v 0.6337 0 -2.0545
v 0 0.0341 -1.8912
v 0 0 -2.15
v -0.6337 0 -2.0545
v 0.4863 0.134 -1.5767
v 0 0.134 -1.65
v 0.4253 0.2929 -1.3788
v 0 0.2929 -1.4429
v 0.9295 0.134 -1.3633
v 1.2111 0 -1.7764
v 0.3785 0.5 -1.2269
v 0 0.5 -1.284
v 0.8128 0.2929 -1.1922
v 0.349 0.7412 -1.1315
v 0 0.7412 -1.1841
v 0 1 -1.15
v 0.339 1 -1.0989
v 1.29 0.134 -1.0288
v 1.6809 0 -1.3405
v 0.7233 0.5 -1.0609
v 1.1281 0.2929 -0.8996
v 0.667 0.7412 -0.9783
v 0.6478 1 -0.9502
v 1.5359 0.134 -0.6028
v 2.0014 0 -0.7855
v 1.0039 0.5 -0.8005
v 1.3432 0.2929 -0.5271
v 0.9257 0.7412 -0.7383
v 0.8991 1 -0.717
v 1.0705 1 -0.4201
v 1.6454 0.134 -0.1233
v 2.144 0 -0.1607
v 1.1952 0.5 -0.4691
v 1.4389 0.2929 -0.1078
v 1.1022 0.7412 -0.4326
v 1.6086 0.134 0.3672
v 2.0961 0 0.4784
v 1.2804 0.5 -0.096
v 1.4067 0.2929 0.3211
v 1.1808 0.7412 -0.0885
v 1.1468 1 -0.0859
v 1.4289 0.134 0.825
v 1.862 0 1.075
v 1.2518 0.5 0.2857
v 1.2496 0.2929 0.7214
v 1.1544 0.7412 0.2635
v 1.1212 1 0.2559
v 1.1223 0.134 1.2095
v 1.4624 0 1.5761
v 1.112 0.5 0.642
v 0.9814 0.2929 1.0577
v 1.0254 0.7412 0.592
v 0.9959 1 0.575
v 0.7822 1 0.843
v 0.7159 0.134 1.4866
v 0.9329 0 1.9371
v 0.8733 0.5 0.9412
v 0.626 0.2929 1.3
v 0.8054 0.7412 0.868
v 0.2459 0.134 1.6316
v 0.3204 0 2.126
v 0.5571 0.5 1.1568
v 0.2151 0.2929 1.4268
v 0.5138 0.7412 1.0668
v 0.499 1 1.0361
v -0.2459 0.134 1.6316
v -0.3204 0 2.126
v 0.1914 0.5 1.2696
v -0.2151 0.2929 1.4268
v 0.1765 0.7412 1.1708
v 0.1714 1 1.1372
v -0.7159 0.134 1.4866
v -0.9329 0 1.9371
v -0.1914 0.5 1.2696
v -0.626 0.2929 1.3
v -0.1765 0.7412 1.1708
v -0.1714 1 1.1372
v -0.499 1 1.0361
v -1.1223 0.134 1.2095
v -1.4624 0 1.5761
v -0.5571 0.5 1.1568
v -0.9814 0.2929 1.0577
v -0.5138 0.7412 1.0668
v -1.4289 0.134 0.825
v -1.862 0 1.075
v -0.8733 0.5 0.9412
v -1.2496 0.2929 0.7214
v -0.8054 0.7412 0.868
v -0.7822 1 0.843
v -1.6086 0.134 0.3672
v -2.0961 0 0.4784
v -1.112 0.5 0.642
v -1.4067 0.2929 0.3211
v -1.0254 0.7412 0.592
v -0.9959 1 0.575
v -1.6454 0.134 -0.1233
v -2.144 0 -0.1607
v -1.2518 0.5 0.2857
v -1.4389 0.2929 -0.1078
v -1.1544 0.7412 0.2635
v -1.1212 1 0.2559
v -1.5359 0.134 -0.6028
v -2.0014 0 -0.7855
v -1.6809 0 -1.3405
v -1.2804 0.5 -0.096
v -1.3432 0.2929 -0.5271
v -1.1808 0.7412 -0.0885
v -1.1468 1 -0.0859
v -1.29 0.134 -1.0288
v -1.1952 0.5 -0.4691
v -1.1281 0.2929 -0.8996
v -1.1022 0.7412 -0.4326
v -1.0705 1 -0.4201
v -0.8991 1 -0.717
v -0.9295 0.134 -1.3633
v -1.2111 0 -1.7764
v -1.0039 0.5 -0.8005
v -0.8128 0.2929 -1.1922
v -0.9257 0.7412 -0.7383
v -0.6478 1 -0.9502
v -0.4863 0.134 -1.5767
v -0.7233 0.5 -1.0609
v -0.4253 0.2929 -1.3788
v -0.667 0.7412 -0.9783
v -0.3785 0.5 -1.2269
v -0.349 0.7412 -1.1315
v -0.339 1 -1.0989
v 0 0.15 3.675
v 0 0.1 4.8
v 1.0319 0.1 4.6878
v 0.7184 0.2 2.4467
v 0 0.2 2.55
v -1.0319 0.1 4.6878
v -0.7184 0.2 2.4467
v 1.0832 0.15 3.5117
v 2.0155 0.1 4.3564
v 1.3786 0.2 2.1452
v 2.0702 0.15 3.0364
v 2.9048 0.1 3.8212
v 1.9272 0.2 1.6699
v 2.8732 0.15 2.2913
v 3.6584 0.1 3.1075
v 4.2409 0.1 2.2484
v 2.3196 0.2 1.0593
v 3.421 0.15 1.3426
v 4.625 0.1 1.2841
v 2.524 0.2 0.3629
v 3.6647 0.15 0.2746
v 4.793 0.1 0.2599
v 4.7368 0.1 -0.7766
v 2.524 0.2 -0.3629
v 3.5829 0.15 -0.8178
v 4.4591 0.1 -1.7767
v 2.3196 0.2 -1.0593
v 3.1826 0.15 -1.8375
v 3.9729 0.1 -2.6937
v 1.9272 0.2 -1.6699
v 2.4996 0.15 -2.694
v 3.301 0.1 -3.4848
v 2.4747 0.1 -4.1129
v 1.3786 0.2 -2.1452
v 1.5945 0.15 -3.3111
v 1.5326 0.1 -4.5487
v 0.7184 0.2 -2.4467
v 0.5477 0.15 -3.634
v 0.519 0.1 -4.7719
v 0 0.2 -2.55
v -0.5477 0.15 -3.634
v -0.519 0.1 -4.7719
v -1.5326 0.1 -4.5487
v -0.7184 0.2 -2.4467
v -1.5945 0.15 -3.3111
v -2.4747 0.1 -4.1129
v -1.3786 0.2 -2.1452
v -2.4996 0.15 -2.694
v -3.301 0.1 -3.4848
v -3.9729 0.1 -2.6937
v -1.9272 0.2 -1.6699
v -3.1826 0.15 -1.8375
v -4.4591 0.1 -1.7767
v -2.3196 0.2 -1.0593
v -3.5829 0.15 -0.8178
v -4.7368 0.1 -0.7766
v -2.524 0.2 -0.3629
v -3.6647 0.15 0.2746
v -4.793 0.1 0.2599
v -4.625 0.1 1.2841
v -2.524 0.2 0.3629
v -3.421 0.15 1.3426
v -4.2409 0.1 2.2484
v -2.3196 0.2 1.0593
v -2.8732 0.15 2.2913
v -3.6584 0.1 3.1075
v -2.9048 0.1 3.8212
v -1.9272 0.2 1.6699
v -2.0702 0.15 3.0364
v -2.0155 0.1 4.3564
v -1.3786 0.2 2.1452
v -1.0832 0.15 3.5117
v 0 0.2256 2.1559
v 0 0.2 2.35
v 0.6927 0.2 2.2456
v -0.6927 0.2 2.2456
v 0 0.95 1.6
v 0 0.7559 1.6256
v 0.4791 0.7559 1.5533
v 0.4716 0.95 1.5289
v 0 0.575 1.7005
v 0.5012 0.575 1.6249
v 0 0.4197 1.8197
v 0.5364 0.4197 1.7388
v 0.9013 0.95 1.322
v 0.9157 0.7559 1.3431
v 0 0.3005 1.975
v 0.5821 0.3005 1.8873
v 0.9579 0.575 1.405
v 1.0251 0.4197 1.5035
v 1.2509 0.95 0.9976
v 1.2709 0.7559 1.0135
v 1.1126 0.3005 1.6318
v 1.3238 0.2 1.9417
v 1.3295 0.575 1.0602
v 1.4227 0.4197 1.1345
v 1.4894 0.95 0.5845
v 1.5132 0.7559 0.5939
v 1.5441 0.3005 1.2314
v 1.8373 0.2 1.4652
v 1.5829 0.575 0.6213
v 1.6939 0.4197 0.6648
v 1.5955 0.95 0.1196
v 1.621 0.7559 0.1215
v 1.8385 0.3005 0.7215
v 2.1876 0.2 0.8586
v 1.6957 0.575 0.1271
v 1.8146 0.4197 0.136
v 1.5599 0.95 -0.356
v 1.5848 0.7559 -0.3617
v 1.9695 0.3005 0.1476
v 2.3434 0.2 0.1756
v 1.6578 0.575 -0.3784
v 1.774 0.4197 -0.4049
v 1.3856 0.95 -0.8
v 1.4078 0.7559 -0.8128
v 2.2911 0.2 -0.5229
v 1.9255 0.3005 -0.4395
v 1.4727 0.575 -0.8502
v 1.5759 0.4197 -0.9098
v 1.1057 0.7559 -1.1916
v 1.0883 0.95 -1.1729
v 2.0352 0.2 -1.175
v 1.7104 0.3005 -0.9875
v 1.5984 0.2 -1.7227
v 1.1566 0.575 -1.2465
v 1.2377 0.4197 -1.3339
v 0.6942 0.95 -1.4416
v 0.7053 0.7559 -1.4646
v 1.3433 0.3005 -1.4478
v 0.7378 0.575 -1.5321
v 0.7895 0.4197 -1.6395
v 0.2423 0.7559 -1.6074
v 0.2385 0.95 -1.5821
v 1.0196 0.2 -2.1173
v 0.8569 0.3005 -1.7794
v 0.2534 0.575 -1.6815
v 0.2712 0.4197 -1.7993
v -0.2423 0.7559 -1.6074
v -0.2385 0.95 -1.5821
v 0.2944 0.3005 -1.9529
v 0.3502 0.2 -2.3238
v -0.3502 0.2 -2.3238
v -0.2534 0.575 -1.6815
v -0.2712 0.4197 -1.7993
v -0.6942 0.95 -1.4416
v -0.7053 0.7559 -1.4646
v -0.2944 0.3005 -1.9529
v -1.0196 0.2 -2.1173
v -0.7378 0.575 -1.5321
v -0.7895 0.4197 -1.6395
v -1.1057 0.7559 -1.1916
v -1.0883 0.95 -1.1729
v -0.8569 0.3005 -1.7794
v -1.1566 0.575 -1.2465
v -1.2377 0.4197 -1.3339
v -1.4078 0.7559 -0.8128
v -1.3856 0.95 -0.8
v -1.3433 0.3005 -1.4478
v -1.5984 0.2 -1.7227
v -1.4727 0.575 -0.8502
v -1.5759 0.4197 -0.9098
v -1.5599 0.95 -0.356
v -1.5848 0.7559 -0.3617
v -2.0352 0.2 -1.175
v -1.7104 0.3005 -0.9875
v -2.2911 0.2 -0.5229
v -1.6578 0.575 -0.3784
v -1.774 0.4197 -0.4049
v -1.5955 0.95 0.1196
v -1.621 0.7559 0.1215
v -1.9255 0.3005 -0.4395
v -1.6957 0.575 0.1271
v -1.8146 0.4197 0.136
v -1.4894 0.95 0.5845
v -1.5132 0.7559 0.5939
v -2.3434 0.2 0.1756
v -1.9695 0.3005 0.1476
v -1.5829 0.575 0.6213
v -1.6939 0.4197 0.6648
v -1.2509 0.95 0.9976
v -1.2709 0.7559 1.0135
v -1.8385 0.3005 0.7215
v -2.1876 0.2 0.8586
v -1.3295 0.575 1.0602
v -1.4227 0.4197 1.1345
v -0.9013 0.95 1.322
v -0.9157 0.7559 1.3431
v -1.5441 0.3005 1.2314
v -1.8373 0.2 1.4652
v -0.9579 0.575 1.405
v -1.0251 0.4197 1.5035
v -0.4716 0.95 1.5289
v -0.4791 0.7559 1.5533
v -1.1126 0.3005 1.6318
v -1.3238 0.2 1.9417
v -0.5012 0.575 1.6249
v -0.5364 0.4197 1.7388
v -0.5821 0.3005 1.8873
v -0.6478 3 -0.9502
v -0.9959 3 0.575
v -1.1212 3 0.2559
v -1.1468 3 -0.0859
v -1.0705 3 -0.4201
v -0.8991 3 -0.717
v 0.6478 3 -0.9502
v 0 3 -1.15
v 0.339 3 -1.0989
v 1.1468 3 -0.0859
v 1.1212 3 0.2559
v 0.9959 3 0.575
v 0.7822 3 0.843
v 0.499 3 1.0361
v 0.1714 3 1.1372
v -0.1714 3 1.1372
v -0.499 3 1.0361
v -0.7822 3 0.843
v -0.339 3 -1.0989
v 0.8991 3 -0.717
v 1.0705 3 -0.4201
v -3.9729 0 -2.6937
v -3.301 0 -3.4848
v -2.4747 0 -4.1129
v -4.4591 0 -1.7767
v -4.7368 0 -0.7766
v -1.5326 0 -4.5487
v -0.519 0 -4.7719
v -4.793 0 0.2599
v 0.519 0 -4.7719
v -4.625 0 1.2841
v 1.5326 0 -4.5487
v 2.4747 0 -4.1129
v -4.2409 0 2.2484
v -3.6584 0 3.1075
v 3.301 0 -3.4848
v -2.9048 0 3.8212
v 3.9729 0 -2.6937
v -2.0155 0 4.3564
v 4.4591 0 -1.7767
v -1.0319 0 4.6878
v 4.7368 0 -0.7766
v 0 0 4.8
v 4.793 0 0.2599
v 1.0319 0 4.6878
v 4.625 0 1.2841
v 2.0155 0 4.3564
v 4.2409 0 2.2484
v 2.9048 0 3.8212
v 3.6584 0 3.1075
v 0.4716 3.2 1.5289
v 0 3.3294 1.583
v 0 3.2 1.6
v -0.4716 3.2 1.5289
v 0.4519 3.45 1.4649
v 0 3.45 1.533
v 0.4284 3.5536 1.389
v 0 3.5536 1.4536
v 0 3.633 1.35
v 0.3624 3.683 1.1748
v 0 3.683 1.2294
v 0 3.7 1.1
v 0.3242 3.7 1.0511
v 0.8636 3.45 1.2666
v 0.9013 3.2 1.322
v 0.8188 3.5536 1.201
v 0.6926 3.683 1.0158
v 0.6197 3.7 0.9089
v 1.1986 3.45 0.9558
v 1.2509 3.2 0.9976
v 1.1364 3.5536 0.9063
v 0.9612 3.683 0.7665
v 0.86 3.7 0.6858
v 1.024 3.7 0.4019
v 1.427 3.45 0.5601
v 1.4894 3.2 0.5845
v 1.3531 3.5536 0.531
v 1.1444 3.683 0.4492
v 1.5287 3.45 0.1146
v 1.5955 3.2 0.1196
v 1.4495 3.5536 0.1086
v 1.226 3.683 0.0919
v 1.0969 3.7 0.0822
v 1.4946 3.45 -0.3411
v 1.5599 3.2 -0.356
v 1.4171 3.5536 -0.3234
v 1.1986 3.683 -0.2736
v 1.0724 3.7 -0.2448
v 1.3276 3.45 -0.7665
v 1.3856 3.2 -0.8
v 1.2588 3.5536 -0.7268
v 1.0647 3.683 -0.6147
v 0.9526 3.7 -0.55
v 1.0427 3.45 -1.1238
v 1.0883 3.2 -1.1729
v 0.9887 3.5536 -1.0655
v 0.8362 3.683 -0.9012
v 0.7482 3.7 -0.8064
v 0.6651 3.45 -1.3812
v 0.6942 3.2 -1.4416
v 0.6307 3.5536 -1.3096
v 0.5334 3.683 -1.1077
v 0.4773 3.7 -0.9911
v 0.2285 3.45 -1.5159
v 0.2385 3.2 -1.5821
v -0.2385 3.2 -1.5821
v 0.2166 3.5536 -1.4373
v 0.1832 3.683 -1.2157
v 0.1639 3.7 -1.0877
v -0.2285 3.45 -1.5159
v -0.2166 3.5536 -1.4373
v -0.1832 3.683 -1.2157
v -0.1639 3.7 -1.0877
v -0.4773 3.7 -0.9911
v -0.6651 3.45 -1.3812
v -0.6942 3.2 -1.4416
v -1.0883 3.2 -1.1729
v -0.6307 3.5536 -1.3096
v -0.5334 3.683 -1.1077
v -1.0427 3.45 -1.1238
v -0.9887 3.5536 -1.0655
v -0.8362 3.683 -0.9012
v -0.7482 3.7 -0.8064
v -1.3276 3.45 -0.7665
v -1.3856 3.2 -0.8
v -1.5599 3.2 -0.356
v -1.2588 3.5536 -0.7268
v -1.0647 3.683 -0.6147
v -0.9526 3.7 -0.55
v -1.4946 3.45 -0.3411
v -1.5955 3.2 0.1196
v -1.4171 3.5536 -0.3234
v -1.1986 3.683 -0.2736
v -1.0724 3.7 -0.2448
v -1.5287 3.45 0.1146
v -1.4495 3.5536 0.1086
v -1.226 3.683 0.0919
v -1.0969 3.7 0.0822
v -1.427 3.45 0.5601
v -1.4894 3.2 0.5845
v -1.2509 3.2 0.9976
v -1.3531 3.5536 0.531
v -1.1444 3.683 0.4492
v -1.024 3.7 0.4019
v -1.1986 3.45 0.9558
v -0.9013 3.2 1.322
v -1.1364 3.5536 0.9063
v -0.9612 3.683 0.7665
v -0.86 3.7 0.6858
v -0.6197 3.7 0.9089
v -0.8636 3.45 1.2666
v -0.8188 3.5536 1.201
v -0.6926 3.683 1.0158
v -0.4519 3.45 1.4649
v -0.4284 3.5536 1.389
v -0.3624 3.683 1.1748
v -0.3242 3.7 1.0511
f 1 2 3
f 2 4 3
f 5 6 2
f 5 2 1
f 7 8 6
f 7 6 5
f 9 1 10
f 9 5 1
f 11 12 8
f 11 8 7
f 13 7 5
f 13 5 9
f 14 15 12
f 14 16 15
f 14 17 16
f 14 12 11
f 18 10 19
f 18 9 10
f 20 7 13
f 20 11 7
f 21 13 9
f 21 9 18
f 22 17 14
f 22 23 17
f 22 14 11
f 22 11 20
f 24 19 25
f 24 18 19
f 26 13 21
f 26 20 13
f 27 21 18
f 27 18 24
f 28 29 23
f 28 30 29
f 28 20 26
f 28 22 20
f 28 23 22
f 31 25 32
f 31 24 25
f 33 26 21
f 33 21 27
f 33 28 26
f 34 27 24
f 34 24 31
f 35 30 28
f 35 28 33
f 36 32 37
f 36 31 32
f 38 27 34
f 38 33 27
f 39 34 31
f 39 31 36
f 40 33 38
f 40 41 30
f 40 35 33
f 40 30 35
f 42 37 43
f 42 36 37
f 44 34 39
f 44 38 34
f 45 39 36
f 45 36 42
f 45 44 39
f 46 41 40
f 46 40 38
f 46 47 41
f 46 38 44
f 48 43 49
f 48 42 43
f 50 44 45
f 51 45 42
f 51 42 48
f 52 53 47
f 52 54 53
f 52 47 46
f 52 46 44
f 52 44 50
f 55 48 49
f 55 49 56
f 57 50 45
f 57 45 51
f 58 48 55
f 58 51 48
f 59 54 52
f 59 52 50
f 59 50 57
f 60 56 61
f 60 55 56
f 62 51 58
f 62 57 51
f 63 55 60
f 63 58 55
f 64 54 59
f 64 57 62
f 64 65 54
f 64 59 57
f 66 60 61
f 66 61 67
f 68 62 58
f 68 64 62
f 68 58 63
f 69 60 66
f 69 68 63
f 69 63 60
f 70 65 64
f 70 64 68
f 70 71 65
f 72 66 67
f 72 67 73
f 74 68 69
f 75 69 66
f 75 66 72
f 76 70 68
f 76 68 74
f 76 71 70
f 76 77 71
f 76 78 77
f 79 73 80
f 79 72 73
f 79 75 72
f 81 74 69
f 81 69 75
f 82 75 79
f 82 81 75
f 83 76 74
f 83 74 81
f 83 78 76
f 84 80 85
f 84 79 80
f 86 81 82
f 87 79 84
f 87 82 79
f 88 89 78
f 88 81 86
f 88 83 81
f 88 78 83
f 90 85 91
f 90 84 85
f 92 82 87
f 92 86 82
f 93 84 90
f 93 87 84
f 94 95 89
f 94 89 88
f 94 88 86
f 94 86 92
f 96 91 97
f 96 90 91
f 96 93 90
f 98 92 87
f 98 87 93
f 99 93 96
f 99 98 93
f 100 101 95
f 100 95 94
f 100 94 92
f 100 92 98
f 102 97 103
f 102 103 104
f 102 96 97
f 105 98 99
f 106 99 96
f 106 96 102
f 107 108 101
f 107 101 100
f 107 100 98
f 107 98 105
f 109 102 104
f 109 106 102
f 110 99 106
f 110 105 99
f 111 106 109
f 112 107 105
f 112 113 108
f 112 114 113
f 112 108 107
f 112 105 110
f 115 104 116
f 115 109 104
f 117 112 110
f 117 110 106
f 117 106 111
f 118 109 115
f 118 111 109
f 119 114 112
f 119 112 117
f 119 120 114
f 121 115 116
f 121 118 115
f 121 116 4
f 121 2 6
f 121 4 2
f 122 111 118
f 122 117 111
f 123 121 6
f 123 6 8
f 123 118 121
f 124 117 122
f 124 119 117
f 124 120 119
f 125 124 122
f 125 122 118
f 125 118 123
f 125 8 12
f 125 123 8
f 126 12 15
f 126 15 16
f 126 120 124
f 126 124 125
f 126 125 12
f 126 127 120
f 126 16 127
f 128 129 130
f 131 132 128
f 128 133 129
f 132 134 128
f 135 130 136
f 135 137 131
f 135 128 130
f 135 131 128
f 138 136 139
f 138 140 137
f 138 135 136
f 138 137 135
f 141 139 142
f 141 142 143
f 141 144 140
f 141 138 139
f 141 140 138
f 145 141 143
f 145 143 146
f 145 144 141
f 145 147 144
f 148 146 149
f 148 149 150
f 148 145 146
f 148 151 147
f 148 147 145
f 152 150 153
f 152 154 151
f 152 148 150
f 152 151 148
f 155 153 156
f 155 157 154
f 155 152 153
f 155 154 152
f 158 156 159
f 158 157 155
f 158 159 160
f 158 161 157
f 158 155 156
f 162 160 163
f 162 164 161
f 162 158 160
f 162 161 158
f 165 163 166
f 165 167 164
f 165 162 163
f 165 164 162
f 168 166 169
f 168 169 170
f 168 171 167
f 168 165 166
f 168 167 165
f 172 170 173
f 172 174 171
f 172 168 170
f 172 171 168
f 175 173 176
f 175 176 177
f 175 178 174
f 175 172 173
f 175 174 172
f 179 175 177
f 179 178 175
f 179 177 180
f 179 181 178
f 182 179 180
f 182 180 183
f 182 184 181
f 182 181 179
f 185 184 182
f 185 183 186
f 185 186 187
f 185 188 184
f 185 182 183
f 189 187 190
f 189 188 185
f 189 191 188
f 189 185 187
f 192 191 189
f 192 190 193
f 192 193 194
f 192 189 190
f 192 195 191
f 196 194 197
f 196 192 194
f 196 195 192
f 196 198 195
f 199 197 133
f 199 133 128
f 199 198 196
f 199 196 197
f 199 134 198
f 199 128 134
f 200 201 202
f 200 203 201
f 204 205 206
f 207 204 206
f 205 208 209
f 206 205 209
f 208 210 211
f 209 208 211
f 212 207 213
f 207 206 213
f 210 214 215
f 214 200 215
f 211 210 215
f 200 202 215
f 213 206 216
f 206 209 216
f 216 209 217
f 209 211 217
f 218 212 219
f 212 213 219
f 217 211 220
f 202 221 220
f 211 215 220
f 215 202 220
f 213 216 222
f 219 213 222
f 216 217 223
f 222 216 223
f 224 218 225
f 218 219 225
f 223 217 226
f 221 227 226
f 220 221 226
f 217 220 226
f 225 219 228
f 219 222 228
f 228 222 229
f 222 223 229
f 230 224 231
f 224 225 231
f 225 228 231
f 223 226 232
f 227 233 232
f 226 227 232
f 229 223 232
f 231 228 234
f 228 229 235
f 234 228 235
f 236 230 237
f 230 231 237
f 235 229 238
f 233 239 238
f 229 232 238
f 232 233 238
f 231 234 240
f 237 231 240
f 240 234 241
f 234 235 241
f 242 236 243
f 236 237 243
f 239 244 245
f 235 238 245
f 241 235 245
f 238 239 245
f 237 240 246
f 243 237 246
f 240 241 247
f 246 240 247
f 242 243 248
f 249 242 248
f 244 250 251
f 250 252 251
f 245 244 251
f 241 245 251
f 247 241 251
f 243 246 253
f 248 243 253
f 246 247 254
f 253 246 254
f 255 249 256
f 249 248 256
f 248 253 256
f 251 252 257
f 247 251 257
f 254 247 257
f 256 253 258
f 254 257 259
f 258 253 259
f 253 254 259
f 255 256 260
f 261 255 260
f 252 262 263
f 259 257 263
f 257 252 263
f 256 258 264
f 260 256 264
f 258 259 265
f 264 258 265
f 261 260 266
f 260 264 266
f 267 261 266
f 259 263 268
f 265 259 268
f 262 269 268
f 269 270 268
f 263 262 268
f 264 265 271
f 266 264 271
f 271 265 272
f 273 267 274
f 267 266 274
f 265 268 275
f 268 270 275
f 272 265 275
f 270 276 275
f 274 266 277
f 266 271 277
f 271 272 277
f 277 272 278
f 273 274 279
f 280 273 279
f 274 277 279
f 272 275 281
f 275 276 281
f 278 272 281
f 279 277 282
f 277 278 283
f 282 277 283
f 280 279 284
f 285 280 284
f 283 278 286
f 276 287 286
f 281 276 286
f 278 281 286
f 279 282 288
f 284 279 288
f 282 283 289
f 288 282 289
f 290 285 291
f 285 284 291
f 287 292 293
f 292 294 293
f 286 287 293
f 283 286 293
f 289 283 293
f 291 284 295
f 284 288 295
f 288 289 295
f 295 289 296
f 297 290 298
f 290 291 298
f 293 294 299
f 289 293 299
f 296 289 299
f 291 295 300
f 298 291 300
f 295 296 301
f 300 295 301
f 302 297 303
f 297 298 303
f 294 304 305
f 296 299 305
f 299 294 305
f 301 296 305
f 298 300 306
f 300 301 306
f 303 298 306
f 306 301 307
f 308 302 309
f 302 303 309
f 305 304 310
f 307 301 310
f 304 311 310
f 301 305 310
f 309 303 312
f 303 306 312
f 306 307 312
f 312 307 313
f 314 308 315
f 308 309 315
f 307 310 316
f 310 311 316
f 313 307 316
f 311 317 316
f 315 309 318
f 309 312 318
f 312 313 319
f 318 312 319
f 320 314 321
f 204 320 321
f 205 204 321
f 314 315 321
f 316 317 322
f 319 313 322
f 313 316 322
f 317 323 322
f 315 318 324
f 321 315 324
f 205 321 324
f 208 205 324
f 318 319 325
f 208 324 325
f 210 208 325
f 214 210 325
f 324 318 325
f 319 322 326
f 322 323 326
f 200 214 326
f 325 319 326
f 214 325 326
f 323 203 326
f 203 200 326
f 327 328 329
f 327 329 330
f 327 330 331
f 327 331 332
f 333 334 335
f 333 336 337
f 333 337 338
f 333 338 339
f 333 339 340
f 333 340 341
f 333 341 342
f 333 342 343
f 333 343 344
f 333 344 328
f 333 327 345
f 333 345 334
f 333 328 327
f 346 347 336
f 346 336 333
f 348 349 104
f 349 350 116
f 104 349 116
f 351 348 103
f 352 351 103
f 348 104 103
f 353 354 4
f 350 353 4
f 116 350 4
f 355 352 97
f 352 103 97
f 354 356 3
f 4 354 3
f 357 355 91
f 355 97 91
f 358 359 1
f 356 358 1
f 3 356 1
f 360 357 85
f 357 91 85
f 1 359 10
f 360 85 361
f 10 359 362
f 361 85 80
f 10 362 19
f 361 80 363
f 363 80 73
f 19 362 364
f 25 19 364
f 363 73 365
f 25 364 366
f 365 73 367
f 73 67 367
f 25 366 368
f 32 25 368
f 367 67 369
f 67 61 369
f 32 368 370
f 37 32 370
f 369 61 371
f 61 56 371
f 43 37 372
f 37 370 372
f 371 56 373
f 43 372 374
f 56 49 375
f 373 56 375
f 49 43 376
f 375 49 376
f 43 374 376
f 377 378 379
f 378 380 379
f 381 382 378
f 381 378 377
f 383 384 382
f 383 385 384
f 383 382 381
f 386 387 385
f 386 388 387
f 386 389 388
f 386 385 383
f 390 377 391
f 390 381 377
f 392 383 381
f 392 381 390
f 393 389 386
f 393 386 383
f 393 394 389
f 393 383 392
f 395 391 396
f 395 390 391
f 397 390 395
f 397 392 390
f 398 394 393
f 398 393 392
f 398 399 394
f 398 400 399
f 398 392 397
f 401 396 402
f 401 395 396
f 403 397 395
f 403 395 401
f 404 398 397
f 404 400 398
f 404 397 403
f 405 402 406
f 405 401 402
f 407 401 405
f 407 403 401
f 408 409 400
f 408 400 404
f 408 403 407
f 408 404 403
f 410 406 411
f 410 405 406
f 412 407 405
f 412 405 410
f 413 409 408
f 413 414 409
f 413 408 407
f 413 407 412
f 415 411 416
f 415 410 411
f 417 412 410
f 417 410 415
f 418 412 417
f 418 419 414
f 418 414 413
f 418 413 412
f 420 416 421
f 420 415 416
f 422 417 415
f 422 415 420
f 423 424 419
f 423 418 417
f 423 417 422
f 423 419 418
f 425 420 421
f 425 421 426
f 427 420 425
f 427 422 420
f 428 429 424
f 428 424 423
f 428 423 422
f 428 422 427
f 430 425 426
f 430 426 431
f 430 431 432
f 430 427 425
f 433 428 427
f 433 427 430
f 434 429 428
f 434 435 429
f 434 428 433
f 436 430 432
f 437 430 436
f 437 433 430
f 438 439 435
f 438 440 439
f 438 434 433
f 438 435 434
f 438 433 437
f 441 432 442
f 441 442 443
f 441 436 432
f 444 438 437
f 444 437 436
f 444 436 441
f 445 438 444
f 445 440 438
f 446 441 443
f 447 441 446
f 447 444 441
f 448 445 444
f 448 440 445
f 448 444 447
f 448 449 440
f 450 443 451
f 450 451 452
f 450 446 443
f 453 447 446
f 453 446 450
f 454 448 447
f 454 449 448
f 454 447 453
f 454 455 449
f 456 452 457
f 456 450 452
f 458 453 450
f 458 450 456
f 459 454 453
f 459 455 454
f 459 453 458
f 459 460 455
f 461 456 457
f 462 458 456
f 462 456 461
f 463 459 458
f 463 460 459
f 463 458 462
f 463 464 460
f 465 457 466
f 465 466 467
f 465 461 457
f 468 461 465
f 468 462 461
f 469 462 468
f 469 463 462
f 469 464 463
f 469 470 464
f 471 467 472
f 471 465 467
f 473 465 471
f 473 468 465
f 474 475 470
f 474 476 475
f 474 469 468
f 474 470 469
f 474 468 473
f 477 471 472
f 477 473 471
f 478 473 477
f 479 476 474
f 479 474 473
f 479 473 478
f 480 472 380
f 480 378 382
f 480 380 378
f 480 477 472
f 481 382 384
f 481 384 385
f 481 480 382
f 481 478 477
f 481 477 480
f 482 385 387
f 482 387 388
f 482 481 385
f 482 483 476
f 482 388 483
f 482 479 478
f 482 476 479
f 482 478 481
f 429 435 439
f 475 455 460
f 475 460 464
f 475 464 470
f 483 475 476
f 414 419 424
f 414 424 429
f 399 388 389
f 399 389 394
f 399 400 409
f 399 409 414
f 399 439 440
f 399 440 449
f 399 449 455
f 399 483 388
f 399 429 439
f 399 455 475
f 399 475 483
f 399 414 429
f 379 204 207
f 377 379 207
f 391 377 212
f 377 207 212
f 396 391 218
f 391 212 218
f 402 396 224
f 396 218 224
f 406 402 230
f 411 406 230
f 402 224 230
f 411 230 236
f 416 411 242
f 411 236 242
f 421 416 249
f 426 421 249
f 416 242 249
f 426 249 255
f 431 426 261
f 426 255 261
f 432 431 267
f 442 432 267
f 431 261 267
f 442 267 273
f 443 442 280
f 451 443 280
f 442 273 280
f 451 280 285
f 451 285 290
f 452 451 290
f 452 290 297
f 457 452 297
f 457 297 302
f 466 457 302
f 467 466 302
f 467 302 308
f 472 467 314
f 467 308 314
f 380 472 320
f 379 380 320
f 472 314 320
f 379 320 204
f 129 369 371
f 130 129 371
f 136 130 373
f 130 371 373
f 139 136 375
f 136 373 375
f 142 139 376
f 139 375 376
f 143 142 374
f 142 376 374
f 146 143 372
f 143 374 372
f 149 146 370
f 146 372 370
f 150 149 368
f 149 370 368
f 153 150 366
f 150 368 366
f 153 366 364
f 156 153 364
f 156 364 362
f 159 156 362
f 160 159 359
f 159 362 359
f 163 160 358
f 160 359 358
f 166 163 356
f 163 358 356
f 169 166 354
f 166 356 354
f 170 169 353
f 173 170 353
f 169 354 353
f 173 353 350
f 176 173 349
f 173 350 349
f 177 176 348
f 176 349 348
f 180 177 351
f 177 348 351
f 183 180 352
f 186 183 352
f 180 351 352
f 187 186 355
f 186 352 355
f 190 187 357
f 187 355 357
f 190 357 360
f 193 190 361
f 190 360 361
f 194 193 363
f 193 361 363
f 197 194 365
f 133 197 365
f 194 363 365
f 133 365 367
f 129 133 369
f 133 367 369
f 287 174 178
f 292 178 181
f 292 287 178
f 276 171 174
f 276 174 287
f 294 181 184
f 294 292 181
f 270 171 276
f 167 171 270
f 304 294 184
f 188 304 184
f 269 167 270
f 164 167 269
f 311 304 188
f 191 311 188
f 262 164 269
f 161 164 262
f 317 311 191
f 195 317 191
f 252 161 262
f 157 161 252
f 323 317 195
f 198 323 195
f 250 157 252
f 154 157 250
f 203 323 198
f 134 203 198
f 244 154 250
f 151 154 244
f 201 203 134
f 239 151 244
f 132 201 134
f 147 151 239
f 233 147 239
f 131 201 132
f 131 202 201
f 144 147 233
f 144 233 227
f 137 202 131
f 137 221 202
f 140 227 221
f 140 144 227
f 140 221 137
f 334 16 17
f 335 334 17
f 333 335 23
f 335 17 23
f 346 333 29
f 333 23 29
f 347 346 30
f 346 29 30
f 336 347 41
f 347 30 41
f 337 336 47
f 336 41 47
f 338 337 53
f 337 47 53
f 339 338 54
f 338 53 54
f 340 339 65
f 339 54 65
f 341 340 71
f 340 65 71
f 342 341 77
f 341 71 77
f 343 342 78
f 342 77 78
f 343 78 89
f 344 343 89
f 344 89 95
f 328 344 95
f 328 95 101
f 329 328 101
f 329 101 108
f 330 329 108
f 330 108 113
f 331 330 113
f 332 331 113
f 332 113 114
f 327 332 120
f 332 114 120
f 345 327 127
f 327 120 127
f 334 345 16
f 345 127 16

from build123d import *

# Parameters (mm, degrees)
CROQUIS1_R              = 4.8
SALIENTE_EXTRUIR1_DEPTH = 0.2
CROQUIS2_R              = 1.6
SALIENTE_EXTRUIR2_DEPTH = 3.5
REDONDEO1_R             = 0.5
REDONDEO2_R             = 0.75
CROQUIS3_R              = 1.15
CORTAR_EXTRUIR1_DEPTH   = 3
REDONDEO3_R             = 1
CHAFL_N1_SIZE           = 0.1
CHAFL_N1_SIZE2          = 2.25


with BuildPart() as part:
    # Croquis1 → Saliente-Extruir1 (new body)
    with BuildSketch(Plane(origin=(0, 0, 0), x_dir=(1, 0, 0), z_dir=(0, 1, 0))):
        with Locations(Location((0, 0, 0), (0, 0, 270))):
            Circle(CROQUIS1_R)
    extrude(amount=SALIENTE_EXTRUIR1_DEPTH)

    # Croquis2 → Saliente-Extruir2 (add)
    with BuildSketch(Plane(origin=(0, 0.2, 0), x_dir=(1, 0, 0), z_dir=(0, 1, 0))):
        with Locations(Location((0, 0, 0), (0, 0, 270))):
            Circle(CROQUIS2_R)
    extrude(amount=SALIENTE_EXTRUIR2_DEPTH)

    # Redondeo1
    redondeo1_edges = [part.edges().sort_by_distance(p)[0] for p in [
        (0, 3.7, -1.6),
    ]]
    fillet(redondeo1_edges, radius=REDONDEO1_R)

    # Redondeo2
    redondeo2_edges = [part.edges().sort_by_distance(p)[0] for p in [
        (0, 0.2, -1.6),
    ]]
    fillet(redondeo2_edges, radius=REDONDEO2_R)

    # Croquis3 → Cortar-Extruir1 (cut)
    with BuildSketch(Plane.XZ):
        with Locations(Location((0, 0, 0), (0, 0, 270))):
            Circle(CROQUIS3_R)
    extrude(amount=-CORTAR_EXTRUIR1_DEPTH, mode=Mode.SUBTRACT)

    # Redondeo3
    redondeo3_edges = [part.edges().sort_by_distance(p)[0] for p in [
        (0, 0, 1.15),
    ]]
    fillet(redondeo3_edges, radius=REDONDEO3_R)

    # Chaflán1
    chafl_n1_edges = [part.edges().sort_by_distance(p)[0] for p in [
        (0, 0.2, -4.8),
    ]]
    chafl_n1_side = [part.faces().sort_by_distance(p)[0] for p in [
        (0, 0.1, -4.8),
    ]]
    chamfer(chafl_n1_edges, length=CHAFL_N1_SIZE, length2=CHAFL_N1_SIZE2, reference=chafl_n1_side[0])


solid = part.part
